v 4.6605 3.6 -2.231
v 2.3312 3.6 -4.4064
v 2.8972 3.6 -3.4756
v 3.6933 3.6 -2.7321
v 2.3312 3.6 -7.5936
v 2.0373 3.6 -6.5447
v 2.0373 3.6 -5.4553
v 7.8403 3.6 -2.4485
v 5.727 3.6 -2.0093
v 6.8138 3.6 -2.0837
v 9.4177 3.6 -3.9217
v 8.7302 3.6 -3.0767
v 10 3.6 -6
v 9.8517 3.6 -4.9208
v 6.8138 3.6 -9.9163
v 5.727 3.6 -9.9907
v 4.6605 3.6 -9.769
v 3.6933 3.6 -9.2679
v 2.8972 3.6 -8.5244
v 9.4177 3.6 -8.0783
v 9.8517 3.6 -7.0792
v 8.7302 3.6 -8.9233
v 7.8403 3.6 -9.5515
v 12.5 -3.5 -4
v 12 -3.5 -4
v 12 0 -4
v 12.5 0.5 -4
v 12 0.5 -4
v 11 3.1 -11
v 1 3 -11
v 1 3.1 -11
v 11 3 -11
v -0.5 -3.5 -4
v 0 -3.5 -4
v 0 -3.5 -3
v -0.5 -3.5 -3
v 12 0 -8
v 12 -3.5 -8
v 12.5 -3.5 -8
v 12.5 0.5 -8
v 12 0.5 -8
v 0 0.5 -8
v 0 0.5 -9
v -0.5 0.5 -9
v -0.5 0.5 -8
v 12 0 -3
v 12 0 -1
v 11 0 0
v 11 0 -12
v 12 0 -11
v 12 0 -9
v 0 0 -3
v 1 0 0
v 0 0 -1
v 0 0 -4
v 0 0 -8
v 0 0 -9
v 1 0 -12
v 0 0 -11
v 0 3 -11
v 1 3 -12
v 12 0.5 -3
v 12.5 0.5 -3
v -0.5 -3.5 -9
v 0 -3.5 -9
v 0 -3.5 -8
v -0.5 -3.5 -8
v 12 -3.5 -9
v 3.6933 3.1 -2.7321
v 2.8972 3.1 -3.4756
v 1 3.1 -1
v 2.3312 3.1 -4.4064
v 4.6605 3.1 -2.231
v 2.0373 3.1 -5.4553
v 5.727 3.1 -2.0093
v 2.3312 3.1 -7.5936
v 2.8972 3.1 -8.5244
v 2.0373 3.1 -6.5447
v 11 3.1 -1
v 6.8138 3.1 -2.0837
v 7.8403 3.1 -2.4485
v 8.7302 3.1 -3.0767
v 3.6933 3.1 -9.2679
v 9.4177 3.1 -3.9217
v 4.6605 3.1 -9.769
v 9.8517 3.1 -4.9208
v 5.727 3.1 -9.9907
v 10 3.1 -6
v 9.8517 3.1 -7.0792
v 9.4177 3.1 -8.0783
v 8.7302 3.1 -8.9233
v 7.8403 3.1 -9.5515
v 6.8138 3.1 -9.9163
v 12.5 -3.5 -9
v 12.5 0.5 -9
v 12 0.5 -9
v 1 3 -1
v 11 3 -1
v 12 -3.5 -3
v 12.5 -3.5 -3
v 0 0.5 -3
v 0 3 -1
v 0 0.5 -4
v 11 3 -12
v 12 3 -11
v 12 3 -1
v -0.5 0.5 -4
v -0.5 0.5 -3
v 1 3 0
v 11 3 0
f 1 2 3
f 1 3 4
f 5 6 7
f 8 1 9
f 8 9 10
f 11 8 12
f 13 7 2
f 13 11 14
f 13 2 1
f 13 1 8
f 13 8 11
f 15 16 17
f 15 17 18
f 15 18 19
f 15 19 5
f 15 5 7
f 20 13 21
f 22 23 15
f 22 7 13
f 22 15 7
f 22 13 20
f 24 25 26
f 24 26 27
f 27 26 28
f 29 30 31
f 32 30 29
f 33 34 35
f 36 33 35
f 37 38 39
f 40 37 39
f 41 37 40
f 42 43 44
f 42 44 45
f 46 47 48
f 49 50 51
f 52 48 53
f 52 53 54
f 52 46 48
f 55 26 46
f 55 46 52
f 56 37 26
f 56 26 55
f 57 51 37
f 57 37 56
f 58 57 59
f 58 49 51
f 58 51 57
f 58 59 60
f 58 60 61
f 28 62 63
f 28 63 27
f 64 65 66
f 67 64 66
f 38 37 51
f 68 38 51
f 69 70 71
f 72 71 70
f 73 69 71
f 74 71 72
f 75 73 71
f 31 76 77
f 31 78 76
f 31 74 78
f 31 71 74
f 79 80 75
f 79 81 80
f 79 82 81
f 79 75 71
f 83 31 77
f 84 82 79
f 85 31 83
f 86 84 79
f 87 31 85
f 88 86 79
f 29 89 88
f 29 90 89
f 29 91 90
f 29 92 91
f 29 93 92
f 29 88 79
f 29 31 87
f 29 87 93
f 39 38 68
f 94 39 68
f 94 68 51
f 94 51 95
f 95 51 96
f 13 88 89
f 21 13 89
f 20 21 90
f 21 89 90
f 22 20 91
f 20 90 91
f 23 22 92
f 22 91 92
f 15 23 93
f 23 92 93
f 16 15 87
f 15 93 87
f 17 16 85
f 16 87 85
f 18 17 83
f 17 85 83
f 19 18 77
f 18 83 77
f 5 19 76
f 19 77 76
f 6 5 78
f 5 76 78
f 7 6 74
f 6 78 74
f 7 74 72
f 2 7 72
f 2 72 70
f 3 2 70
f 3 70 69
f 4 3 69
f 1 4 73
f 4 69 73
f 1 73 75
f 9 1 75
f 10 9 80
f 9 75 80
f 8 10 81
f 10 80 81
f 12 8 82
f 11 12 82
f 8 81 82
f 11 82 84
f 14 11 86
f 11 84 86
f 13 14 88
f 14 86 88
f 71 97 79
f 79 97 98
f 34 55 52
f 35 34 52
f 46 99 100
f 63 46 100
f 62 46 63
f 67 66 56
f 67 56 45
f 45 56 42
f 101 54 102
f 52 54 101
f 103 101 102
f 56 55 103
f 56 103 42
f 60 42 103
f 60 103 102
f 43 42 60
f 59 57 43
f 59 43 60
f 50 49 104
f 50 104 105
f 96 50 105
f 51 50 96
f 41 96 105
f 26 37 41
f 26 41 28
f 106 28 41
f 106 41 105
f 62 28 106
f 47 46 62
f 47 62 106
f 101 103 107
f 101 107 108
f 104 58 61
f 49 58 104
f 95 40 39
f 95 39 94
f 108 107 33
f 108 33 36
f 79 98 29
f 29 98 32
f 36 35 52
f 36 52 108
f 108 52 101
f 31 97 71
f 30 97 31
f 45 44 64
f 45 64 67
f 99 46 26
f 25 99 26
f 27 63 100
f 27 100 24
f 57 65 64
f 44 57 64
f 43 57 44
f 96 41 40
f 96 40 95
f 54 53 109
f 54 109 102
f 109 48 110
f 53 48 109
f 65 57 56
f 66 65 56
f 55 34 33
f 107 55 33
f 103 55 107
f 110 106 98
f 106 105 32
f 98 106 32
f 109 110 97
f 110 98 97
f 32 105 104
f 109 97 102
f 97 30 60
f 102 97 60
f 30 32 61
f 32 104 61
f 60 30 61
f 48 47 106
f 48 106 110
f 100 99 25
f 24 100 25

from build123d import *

# Parameters (mm, degrees)
BOSS_EXTRU_2_DEPTH         = 3
ESQUISSE2_W                = 10
ESQUISSE2_H                = 10
BOSS_EXTRU_3_DEPTH         = 0.1
ESQUISSE3_R                = 4
BOSS_EXTRU_4_DEPTH         = 0.5
ESQUISSE4_W                = 1
ESQUISSE4_H                = 4
BOSS_EXTRU_5_DEPTH         = 0.5
ESQUISSE7_W                = 1
ESQUISSE7_H                = 4
BOSS_EXTRU_7_DEPTH         = 0.5
R_P_TITION_LIN_AIRE1_COUNT = 2
R_P_TITION_LIN_AIRE1_PITCH = 5


with BuildPart() as part:
    # Esquisse1 → Boss.-Extru.2 (new body)
    with BuildSketch(Plane(origin=(0, 0, 0), x_dir=(1, 0, 0), z_dir=(0, 1, 0))):
        Polygon((0, 11), (1, 12), (11, 12), (12, 11), (12, 1), (11, 0), (1, 0), (0, 1), align=None)
    extrude(amount=BOSS_EXTRU_2_DEPTH)

    # Esquisse2 → Boss.-Extru.3 (add)
    with BuildSketch(Plane(origin=(0, 3, 0), x_dir=(1, 0, 0), z_dir=(0, 1, 0))):
        with Locations((6, 6)):
            Rectangle(ESQUISSE2_W, ESQUISSE2_H)
    extrude(amount=BOSS_EXTRU_3_DEPTH)

    # Esquisse3 → Boss.-Extru.4 (add)
    with BuildSketch(Plane(origin=(0, 3.1, 0), x_dir=(1, 0, 0), z_dir=(0, 1, 0))):
        with Locations((6, 6)):
            Circle(ESQUISSE3_R)
    extrude(amount=BOSS_EXTRU_4_DEPTH)

    # Esquisse4 → Boss.-Extru.5 (add)
    with BuildSketch(Plane.ZY):
        with Locations((-8.5, -1.5)):
            Rectangle(ESQUISSE4_W, ESQUISSE4_H)
    boss_extru_5 = extrude(amount=BOSS_EXTRU_5_DEPTH)

    # Esquisse7 → Boss.-Extru.7 (add)
    with BuildSketch(Plane(origin=(12, 0, 0), x_dir=(0, 0, -1), z_dir=(1, 0, 0))):
        with Locations((8.5, -1.5)):
            Rectangle(ESQUISSE7_W, ESQUISSE7_H)
    boss_extru_7 = extrude(amount=BOSS_EXTRU_7_DEPTH)

    # Répétition linéaire1: Boss.-Extru.5, Boss.-Extru.7 ×2
    with Locations(*[(0, 0, i * R_P_TITION_LIN_AIRE1_PITCH) for i in range(1, R_P_TITION_LIN_AIRE1_COUNT)]):
        add(boss_extru_5)
        add(boss_extru_7)


solid = part.part
